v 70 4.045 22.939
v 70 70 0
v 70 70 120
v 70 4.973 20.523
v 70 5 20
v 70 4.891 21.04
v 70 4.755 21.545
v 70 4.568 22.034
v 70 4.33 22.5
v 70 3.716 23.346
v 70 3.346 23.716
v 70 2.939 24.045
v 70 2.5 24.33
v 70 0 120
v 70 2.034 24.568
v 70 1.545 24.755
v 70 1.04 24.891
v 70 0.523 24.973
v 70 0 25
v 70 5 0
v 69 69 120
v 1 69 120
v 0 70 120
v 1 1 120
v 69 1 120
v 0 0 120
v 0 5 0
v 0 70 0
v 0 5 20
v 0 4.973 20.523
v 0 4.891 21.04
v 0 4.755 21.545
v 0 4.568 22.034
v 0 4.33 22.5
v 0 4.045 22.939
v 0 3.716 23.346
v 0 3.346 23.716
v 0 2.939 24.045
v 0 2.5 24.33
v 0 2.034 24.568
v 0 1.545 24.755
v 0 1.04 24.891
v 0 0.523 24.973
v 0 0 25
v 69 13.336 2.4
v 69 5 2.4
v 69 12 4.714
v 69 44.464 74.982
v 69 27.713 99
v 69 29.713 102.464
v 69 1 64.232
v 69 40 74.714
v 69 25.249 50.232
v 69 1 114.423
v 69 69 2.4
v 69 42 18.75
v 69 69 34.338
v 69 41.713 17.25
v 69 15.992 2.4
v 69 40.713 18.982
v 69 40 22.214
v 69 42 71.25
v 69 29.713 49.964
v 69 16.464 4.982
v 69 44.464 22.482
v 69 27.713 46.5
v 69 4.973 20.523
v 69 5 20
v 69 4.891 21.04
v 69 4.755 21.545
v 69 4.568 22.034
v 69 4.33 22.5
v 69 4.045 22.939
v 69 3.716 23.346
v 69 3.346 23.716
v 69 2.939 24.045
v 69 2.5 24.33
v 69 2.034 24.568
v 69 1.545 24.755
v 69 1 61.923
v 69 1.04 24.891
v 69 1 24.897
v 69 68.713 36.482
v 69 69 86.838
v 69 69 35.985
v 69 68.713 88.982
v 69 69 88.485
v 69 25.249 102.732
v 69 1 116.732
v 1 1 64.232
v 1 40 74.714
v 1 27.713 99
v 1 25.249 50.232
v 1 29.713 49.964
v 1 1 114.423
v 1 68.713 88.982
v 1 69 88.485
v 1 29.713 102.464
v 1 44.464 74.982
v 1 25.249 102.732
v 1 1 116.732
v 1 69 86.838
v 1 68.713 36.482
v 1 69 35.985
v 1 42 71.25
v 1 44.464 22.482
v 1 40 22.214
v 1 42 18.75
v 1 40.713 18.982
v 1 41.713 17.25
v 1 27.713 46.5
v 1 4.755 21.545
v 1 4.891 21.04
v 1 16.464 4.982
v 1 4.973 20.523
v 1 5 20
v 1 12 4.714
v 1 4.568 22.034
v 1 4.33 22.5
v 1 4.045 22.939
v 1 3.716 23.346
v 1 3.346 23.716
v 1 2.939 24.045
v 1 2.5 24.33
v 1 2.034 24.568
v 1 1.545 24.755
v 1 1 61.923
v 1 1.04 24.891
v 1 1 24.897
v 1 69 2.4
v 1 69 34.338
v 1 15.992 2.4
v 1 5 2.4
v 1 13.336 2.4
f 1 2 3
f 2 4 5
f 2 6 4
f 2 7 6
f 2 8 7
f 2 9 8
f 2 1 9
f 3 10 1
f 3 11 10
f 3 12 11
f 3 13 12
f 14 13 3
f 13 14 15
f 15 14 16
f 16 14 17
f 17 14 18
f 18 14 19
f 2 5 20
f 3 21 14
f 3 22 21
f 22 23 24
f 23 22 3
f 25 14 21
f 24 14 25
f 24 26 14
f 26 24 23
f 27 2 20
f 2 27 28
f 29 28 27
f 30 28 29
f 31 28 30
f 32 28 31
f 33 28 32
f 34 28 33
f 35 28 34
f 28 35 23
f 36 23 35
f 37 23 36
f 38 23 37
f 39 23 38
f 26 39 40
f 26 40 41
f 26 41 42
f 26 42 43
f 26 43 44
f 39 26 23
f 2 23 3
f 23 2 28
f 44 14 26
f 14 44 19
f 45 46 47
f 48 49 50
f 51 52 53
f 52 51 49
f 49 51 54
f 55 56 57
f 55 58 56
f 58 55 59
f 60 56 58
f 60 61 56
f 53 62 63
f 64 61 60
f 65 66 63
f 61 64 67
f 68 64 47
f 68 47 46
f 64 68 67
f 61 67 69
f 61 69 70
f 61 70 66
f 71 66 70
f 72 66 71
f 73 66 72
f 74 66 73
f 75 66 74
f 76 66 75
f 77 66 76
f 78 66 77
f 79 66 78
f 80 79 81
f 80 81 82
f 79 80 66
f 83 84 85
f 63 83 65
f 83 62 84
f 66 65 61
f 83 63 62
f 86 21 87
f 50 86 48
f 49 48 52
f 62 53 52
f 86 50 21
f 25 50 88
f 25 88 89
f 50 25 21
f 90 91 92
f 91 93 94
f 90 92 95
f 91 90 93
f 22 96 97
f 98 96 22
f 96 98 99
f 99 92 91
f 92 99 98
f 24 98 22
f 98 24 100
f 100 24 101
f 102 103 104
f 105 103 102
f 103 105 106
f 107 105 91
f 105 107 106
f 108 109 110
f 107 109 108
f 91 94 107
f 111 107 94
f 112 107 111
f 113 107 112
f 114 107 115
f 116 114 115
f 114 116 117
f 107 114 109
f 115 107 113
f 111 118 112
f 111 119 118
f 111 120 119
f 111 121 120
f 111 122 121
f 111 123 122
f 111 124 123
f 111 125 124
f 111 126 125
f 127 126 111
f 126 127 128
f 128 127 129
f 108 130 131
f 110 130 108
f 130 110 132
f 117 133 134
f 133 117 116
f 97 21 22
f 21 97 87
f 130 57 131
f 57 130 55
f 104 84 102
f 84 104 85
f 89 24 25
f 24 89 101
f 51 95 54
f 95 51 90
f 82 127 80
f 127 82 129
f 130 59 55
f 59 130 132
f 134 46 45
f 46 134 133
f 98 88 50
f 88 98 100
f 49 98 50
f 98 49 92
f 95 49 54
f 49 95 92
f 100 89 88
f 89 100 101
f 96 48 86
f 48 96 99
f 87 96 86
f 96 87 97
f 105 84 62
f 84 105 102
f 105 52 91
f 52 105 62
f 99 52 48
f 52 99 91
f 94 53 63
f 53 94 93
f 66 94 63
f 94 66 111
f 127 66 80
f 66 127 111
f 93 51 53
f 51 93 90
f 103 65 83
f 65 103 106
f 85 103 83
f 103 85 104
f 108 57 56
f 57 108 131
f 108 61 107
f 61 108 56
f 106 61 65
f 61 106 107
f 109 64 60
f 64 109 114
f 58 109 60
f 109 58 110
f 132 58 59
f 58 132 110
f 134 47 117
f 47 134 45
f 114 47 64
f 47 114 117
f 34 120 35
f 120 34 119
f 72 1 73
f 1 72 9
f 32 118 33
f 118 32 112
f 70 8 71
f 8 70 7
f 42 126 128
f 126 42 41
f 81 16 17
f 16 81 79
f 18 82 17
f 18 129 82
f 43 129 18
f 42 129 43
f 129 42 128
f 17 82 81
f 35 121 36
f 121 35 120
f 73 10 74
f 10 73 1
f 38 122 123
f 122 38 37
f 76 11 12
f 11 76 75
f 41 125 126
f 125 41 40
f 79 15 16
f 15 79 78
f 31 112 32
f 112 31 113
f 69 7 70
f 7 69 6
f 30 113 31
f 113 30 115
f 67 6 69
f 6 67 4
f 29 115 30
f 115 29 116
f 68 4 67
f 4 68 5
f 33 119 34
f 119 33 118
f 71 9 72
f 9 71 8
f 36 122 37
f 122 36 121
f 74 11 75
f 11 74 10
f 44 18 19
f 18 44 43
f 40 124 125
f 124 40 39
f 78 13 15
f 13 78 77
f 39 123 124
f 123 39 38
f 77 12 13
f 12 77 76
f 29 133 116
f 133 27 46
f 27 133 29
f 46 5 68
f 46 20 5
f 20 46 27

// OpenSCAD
// Dice Tower
$fn = 60 ;
// Dimensions in millimetres

MaxTowerX = 70 ;
MaxTowerY = 70 ;
towerH    = 120  ;
baseZ     = 2.4 ;
maxDieSize = 25.00 ;
//
// Baffle atributes
//
baffleThickness = 1.5 ;
topBaffle       = 5.00 ;  // below top of the Tower
baffleAngle     = 60.0 ; // degrees
baffleZ         = 0.50 * MaxTowerX * cos(baffleAngle) ;
baffleX         = 0.75 * MaxTowerX * sin(baffleAngle) ;

offsetX = 1.0; offsetY = 1.0; offsetZ = 1.0 ;

module towerBase(MaxTowerX, MaxTowerY, height ) {

        cube([MaxTowerX,MaxTowerY,height]) ; //cylinder(h=height, r=MaxTowerY/2) ;
    
    }

module baffle1() {
mypoly1 = [[0,0],[0,32],[4,32],[2,28],[2,0]] ;

rotate([-90,-60,90])linear_extrude(MaxTowerX) polygon(mypoly1) ;
}


module baffle2() {

mypoly2 = [[0,0],[0,32],[2,32],[2,4],[4,0]] ;

rotate([90,-60,-90])linear_extrude(MaxTowerX) polygon(mypoly2) ;
}

module tower() {
// Draw physical base
translate([0,0,0]) towerBase(MaxTowerX, MaxTowerY, baseZ ) ;
// Draw tower exterior
difference() {
    translate([0,0,0]) towerBase(MaxTowerX, MaxTowerY, towerH ) ;

    translate([offsetX,offsetY,offsetZ]) towerBase(MaxTowerX - 2*offsetX , MaxTowerY - 2*offsetY, towerH+baseZ) ;
}

// Add top baffle
translate([MaxTowerX,0,towerH-topBaffle-0*baffleZ])       
        baffle1() ;

// Add second baffle
translate([MaxTowerX, MaxTowerY-28, towerH-topBaffle-2.5*baffleZ]) 
    //rotate([0,baffleAngle-90,0]) 
        baffle2() ;

// Add third baffle
translate([MaxTowerX,0,towerH-topBaffle-3.0*baffleZ]) 
    //rotate([0,90-baffleAngle,0])  
        baffle1() ;

// Add fourth baffles
translate([MaxTowerX, MaxTowerY-28, towerH-topBaffle-5.5*baffleZ]) 
    //rotate([0,baffleAngle-90,0]) 
        baffle2() ;
translate([MaxTowerX, MaxTowerY-56, towerH-topBaffle-6.5*baffleZ]) 
    //rotate([0,baffleAngle-90,0]) 
        baffle2() ;

}

//

module exit() {

  translate([0,5,21])rotate([0,90,0])cylinder(h=MaxTowerX+2, r=5) ;
rotate([0,0,0])cube([MaxTowerX+2,10,21]) ;   
}

difference() {
    tower() ;

    translate([-1,-5,-1])exit() ;
}
